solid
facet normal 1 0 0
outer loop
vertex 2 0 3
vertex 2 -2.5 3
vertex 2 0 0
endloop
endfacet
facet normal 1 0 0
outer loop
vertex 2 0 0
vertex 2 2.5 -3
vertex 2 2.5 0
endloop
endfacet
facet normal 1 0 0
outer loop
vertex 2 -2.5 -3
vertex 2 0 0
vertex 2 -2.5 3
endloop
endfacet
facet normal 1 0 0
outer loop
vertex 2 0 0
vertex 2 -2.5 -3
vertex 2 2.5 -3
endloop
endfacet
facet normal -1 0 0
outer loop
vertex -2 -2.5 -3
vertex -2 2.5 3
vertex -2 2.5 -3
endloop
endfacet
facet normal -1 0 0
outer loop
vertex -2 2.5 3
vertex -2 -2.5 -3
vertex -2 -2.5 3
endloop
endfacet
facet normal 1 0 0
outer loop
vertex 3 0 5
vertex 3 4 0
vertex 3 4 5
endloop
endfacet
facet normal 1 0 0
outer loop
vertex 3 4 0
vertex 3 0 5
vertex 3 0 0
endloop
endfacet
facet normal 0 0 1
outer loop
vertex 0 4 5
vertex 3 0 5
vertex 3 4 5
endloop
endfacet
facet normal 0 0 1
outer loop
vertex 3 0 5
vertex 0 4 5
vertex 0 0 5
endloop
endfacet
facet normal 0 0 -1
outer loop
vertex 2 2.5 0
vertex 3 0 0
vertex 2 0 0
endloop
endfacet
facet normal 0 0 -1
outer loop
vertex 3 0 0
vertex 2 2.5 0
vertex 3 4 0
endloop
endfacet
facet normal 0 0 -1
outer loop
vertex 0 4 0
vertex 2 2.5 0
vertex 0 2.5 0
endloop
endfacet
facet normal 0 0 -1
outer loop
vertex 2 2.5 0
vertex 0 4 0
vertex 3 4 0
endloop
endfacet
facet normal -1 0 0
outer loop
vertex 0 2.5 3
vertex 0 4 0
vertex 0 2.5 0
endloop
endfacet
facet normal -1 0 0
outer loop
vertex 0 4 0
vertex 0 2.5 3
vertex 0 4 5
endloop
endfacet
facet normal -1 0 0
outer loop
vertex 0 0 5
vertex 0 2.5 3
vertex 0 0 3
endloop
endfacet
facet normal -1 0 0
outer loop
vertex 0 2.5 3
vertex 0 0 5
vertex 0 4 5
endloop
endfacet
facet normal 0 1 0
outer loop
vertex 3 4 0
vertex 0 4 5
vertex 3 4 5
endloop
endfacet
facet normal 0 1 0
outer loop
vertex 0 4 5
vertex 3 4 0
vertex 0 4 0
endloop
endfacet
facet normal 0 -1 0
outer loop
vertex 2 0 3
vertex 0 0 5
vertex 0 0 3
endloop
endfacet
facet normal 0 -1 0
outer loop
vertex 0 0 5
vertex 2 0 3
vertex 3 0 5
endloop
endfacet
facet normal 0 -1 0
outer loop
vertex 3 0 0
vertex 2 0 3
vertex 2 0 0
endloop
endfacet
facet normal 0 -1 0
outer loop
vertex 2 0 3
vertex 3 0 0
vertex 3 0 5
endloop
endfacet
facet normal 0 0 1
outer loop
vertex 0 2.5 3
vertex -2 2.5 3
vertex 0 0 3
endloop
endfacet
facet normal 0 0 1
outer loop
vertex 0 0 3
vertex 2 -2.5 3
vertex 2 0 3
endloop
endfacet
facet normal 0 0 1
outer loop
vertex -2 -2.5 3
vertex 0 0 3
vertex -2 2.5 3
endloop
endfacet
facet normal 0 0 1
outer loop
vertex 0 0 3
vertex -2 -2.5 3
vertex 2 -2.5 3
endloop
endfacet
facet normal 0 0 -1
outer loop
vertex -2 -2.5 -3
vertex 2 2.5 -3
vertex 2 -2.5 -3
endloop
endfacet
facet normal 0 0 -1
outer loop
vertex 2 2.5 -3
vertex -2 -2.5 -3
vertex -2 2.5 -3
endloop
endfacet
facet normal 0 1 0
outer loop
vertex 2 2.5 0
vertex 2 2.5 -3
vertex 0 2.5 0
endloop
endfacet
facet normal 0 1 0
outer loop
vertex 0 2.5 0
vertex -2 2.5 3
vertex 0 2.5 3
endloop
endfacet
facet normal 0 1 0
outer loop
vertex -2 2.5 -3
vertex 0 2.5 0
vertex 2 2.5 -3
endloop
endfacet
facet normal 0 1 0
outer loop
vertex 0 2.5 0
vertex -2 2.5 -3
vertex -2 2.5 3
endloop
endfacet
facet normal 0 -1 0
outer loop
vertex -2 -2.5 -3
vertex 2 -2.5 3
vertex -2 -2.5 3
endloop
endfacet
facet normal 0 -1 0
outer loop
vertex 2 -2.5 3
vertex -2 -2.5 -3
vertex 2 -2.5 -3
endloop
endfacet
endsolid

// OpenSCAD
cube();
cube(1);
cube(size=2);
cube(3,true);
cube(size=4, center=true);
cube([1,2,3]);
cube([2,3,4],true);
cube(size=[3,4,5]);
cube(size=[4,5,6], center=true);
